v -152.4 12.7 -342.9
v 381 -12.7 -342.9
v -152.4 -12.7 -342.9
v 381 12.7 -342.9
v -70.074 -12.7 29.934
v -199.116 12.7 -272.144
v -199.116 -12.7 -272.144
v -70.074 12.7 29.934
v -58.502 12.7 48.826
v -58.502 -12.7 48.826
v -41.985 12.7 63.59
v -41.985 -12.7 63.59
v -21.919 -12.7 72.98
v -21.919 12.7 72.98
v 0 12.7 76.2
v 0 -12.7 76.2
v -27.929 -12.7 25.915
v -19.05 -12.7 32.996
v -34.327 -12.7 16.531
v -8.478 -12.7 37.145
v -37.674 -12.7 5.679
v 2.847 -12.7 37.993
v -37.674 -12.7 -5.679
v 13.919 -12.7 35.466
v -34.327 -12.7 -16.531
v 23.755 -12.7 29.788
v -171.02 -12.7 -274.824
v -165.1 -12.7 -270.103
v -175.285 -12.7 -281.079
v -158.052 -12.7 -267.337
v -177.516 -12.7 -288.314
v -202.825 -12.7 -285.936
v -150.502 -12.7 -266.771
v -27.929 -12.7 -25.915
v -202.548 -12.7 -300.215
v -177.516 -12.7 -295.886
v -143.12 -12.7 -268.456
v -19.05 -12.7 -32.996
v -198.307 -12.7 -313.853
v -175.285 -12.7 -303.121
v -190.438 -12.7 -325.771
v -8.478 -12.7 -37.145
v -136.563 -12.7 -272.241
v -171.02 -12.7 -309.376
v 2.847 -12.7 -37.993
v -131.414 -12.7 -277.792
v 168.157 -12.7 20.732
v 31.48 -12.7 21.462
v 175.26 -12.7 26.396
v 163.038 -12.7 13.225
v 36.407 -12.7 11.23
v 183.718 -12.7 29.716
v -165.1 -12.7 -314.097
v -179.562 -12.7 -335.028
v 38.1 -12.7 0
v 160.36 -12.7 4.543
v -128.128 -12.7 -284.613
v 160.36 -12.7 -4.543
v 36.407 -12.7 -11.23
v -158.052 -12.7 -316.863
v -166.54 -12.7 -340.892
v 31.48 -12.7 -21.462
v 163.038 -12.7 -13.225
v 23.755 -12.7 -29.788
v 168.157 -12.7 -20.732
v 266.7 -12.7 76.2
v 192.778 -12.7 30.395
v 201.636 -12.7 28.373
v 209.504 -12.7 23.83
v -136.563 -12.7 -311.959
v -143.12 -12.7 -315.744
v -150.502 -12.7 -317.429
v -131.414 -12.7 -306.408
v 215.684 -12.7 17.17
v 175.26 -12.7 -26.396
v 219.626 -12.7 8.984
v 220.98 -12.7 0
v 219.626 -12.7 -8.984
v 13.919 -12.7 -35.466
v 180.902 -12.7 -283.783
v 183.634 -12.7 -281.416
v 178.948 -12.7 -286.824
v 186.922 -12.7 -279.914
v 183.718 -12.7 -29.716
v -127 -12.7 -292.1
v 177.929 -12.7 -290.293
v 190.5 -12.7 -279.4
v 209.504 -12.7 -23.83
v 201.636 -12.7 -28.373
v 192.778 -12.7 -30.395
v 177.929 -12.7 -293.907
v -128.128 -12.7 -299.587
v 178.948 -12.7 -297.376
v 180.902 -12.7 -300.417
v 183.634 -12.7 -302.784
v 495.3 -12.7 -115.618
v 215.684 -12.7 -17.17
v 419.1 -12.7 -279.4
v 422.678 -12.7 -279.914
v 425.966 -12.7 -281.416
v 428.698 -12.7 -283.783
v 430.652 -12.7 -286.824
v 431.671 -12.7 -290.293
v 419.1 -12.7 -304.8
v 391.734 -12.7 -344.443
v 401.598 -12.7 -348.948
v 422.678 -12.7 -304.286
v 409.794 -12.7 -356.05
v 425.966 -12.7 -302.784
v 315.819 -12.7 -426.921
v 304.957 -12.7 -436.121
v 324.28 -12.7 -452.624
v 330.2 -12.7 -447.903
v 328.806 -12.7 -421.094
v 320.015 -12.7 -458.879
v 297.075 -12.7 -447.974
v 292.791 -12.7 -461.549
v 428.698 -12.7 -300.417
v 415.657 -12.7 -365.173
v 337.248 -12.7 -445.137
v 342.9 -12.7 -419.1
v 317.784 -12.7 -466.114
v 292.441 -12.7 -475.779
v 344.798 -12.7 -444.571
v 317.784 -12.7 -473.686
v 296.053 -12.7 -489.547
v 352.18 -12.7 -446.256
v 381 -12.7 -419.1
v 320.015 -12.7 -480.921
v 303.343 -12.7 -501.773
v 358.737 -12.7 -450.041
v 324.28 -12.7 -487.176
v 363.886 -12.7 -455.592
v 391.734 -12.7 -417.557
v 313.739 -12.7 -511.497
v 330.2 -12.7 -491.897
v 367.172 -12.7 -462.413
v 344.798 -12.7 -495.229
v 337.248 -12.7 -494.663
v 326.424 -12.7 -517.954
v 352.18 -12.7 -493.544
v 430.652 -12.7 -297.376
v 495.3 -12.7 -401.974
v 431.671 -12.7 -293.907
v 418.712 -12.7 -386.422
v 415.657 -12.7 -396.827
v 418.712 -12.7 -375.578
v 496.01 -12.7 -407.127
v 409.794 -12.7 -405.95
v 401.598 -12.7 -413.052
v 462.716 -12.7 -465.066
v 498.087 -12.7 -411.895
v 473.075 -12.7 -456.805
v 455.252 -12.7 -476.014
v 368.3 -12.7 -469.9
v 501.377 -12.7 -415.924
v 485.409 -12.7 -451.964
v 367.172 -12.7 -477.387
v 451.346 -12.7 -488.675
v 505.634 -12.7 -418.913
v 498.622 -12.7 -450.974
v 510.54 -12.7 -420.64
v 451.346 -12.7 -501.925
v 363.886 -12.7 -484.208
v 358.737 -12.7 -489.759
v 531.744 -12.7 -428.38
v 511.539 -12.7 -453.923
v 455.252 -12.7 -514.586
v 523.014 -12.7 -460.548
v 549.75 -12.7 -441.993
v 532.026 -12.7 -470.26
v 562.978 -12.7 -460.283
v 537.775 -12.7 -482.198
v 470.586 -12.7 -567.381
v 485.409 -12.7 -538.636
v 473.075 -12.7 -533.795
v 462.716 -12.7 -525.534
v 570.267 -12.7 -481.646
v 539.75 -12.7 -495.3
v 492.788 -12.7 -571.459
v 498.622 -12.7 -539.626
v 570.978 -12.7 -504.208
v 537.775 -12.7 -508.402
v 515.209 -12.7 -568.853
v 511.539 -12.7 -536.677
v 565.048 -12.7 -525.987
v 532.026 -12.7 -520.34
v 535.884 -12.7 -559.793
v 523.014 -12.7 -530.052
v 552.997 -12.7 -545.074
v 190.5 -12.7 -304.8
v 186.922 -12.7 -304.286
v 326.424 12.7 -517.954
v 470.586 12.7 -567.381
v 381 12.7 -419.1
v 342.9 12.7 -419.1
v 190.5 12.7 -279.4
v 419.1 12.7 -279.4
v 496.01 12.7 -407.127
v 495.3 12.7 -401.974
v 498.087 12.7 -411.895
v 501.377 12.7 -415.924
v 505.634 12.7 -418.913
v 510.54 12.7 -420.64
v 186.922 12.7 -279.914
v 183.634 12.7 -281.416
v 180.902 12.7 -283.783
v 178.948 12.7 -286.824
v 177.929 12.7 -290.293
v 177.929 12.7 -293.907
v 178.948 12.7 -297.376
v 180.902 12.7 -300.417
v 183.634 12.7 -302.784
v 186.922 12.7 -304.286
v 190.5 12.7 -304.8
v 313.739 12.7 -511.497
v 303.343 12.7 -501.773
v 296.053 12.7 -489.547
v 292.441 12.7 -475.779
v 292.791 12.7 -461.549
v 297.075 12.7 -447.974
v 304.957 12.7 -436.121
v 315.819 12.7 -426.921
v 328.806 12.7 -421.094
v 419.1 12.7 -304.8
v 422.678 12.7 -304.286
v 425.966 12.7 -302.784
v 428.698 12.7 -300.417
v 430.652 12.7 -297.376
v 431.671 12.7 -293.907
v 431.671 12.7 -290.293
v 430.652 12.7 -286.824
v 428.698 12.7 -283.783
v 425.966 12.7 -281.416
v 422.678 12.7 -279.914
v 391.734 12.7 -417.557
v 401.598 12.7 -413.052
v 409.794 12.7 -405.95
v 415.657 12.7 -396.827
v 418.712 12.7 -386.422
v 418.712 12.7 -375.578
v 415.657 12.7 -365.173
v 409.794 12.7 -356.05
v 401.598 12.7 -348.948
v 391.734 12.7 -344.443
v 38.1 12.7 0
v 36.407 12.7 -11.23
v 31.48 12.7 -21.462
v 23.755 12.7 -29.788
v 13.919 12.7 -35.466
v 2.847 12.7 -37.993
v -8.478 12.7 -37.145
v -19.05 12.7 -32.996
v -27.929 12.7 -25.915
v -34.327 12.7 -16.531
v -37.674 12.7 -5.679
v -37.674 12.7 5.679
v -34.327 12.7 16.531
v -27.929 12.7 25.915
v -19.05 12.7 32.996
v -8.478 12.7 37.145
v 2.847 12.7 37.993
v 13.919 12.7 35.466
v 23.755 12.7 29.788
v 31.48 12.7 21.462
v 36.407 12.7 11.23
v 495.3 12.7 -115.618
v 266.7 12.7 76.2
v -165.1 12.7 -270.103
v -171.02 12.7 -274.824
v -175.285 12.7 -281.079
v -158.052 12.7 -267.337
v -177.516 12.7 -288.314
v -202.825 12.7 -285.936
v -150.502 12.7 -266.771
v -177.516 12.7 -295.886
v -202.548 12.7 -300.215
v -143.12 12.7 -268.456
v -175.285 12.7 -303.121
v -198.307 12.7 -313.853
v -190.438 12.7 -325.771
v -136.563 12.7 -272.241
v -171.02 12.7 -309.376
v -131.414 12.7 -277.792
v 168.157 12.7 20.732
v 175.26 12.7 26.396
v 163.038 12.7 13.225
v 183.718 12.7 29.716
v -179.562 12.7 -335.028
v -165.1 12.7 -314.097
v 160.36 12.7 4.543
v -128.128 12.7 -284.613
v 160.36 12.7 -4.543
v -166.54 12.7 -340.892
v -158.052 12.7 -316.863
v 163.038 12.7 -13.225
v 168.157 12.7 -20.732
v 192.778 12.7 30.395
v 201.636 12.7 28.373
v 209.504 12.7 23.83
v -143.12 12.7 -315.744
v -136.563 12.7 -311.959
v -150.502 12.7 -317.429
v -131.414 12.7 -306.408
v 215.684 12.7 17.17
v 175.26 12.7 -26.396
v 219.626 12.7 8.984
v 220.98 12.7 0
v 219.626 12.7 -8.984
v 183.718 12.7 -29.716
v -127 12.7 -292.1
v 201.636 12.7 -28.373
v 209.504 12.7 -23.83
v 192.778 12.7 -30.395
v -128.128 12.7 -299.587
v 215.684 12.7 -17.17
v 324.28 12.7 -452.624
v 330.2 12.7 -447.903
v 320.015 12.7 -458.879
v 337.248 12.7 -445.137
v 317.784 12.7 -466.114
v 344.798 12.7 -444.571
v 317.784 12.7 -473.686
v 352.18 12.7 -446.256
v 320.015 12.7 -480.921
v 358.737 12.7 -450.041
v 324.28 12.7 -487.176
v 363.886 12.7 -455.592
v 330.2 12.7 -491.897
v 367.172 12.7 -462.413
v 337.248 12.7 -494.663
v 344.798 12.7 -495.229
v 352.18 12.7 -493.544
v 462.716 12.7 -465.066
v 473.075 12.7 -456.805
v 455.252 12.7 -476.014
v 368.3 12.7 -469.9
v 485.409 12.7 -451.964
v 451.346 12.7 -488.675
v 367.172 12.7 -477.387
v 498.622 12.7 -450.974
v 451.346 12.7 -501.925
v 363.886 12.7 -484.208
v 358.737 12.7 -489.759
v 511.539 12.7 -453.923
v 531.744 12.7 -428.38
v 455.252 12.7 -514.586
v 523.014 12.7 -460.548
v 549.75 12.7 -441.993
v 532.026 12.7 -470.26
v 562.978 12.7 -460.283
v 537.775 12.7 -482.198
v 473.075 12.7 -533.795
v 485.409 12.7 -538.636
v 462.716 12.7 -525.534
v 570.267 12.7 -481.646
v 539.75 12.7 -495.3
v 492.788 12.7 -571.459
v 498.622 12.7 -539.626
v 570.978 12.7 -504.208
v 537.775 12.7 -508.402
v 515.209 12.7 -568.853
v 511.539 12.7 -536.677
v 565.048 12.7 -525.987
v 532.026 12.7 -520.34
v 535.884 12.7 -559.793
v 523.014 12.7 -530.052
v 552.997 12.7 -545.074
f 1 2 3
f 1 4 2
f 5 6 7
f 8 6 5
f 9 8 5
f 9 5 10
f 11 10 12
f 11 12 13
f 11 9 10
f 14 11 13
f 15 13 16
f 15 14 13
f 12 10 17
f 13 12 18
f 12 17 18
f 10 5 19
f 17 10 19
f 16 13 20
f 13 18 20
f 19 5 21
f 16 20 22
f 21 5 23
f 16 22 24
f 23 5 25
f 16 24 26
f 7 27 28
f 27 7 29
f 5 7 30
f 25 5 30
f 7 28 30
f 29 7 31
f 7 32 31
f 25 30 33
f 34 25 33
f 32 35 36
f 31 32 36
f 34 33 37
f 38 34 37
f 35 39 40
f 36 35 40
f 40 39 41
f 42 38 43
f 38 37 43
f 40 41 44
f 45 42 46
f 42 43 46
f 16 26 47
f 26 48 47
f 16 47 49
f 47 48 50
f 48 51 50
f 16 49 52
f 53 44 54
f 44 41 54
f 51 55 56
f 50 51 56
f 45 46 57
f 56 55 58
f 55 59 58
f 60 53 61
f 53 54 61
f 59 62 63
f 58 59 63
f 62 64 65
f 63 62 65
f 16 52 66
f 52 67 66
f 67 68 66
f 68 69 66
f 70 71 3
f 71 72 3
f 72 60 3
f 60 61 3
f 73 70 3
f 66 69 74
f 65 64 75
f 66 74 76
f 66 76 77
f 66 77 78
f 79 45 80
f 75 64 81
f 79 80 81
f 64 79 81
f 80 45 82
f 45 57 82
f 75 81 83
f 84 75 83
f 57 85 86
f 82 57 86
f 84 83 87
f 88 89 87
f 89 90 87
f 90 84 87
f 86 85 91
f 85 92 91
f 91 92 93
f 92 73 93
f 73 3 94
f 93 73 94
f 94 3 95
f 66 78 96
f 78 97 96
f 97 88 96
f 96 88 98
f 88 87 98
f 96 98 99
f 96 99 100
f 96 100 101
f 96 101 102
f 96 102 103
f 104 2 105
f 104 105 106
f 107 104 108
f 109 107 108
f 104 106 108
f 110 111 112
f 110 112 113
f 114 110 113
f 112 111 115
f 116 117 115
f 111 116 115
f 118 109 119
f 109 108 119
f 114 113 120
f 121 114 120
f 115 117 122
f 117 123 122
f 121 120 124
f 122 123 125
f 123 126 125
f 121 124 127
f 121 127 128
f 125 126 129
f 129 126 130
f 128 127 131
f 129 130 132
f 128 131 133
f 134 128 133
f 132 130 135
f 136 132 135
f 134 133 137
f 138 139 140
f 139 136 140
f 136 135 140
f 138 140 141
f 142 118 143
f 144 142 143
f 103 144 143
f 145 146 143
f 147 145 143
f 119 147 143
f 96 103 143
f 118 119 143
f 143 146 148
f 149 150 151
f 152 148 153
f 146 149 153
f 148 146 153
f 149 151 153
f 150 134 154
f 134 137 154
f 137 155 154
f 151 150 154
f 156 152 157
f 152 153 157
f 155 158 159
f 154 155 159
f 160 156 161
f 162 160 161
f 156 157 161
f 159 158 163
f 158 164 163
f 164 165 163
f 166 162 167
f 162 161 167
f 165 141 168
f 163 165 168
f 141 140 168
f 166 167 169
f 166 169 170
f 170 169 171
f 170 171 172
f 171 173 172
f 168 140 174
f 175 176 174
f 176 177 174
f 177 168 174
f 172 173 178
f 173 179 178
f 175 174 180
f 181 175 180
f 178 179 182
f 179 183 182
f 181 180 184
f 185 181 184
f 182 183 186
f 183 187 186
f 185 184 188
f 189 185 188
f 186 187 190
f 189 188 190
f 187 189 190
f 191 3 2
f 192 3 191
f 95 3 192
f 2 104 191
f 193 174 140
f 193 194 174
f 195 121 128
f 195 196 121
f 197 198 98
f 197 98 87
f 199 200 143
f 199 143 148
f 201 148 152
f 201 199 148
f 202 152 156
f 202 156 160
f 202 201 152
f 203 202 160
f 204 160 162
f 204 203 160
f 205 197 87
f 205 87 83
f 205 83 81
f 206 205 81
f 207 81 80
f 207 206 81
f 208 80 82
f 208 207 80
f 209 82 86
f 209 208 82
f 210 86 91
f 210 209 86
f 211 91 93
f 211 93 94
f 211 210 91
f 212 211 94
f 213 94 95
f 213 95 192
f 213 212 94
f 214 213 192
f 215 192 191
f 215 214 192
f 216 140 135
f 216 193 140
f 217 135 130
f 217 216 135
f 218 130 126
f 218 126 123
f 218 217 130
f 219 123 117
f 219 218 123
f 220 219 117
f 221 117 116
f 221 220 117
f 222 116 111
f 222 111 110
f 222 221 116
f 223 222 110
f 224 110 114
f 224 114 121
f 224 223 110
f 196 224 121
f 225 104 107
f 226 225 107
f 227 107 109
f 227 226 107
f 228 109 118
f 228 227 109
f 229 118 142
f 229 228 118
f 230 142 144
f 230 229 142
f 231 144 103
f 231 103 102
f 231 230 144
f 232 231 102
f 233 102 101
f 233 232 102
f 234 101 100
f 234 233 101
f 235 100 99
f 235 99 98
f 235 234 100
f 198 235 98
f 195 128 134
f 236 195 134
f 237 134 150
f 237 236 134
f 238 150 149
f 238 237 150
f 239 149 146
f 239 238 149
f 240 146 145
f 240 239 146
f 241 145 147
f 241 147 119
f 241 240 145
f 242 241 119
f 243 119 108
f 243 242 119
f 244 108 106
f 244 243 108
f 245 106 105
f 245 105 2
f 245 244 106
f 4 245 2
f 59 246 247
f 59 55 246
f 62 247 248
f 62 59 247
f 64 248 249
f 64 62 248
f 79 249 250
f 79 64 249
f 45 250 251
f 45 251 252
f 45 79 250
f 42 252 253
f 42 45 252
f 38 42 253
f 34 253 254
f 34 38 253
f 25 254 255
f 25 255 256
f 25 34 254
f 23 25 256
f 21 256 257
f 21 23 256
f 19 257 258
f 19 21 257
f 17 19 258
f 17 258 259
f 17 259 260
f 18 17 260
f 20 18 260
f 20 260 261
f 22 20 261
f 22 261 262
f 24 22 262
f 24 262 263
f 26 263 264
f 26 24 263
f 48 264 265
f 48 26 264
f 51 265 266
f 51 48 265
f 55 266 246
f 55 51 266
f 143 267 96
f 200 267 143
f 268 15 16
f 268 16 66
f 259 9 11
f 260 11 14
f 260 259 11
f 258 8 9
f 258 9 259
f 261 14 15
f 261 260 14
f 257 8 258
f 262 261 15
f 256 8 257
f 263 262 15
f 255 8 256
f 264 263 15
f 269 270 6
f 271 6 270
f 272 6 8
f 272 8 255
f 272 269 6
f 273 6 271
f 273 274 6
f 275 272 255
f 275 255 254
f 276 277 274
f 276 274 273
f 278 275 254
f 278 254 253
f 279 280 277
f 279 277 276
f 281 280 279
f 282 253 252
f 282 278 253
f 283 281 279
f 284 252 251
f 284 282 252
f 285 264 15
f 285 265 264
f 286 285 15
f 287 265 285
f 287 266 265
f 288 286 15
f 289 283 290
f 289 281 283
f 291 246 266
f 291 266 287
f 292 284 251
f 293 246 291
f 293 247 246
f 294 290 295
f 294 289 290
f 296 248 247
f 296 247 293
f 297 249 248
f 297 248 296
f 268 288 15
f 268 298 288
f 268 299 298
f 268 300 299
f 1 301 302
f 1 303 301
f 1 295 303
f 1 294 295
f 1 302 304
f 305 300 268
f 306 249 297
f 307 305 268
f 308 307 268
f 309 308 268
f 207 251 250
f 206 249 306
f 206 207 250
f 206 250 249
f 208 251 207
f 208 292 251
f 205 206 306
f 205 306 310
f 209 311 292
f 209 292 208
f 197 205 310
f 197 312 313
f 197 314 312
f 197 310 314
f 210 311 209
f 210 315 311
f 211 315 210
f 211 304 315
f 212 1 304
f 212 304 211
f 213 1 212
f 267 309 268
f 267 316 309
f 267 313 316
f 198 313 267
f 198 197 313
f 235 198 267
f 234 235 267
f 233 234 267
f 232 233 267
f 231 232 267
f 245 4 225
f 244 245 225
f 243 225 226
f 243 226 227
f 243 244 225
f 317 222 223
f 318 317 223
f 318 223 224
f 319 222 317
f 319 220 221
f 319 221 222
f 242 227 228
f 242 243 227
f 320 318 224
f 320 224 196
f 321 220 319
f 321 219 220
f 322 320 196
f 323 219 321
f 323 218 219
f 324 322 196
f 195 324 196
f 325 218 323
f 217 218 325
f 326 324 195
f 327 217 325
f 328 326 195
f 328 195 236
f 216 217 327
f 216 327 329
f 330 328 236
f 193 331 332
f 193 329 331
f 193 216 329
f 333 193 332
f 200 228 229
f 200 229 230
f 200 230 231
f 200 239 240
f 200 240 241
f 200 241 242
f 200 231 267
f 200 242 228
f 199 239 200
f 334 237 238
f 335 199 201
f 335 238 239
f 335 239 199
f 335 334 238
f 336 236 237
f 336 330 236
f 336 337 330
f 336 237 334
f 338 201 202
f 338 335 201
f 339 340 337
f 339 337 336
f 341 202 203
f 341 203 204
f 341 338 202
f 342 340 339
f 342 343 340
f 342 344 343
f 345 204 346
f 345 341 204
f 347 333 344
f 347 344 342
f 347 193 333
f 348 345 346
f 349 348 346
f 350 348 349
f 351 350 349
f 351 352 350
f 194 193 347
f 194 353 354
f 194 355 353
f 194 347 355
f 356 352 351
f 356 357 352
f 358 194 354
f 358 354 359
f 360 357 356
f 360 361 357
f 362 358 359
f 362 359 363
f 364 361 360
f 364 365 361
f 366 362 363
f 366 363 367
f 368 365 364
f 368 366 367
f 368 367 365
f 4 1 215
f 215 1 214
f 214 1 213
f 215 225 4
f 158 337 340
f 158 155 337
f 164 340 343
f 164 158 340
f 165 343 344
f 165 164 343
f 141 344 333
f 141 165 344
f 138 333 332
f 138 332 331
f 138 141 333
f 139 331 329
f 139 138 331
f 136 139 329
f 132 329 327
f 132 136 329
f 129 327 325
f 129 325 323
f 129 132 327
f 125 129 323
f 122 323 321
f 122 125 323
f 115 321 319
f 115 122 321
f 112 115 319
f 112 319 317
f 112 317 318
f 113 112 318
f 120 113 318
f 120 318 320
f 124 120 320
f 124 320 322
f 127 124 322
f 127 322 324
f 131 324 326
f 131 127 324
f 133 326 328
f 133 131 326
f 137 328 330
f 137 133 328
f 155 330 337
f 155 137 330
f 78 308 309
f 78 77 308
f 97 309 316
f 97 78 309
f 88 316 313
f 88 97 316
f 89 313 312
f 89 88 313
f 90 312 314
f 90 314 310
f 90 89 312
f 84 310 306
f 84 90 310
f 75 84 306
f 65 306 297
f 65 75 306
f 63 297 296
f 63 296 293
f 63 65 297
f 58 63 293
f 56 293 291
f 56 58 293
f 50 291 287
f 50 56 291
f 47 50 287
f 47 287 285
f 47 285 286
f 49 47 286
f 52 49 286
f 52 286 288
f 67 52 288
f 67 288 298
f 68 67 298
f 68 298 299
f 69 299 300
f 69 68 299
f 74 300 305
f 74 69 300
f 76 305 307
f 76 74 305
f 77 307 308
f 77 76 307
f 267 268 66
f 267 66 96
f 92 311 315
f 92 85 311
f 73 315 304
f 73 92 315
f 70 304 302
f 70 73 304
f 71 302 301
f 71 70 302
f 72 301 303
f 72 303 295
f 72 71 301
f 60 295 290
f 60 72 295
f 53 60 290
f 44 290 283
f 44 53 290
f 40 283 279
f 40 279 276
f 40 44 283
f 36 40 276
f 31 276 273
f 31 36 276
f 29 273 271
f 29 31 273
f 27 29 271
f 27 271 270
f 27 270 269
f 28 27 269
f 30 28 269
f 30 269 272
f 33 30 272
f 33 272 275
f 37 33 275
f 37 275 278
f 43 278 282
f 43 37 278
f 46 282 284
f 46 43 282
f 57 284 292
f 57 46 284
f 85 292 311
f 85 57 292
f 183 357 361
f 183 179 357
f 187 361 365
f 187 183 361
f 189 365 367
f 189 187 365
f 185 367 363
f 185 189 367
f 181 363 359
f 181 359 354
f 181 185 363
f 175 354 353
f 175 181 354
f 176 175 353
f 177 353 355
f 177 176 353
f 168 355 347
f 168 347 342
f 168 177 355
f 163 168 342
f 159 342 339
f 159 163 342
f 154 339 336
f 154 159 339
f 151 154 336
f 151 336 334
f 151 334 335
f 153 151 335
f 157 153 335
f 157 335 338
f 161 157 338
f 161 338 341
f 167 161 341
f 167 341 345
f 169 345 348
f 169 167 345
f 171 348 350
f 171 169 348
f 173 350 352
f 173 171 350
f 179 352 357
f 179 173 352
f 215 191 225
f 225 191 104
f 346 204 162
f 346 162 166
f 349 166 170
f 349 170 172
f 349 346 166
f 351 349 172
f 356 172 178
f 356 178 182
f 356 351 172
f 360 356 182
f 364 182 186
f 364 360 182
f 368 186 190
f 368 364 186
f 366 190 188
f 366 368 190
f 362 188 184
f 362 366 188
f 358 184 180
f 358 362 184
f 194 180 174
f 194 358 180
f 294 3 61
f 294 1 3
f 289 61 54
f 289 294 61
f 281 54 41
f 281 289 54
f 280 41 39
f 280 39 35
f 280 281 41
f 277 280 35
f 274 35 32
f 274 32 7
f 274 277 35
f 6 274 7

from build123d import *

# Parameters (mm, degrees)
SKETCH1_R           = 25.4
SKETCH1_R_2         = 38.1
SKETCH1_R_3         = 44.45
SKETCH1_R_4         = 30.48
BOSS_EXTRUDE1_DEPTH = 12.7


with BuildPart() as part:
    # Sketch1 → Boss-Extrude1 (new body, symmetric)
    with BuildSketch(Plane(origin=(0, 0, 0), x_dir=(1, 0, 0), z_dir=(0, 1, 0))):
        with BuildLine():
            Line((-199.116056599, 272.143796557), (-70.074084898, -29.934305164))
            ThreePointArc((-70.074084898, -29.934305164), (-41.984794548, -63.590227447), (0, -76.2))
            Line((0, -76.2), (266.7, -76.2))
            Line((266.7, -76.2), (495.3, 115.618175687))
            Line((495.3, 115.618175687), (495.3, 401.9744408))
            ThreePointArc((495.3, 401.9744408), (499.593933451, 414.022718685), (510.54, 420.63955264))
            ThreePointArc((510.54, 420.63955264), (568.823505812, 515.318343915), (470.586486486, 567.381081081))
            Line((470.586486486, 567.381081081), (326.424324324, 517.954054054))
            ThreePointArc((326.424324324, 517.954054054), (292.791188669, 461.548531445), (342.9, 419.1))
            Line((342.9, 419.1), (381, 419.1))
            ThreePointArc((381, 419.1), (419.1, 381), (381, 342.9))
            Line((381, 342.9), (-152.4, 342.9))
            ThreePointArc((-152.4, 342.9), (-194.793484965, 320.089863032), (-199.116056599, 272.143796557))
        make_face()
        with Locations((-152.4, 292.1)):
            Circle(SKETCH1_R, mode=Mode.SUBTRACT)
        Circle(SKETCH1_R_2, mode=Mode.SUBTRACT)
        with Locations((342.9, 469.9)):
            Circle(SKETCH1_R, mode=Mode.SUBTRACT)
        with Locations((495.3, 495.3)):
            Circle(SKETCH1_R_3, mode=Mode.SUBTRACT)
        with Locations((190.5, 0)):
            Circle(SKETCH1_R_4, mode=Mode.SUBTRACT)
        with BuildLine():
            Line((190.5, 304.8), (419.1, 304.8))
            ThreePointArc((419.1, 304.8), (431.8, 292.1), (419.1, 279.4))
            Line((419.1, 279.4), (190.5, 279.4))
            ThreePointArc((190.5, 279.4), (177.8, 292.1), (190.5, 304.8))
        make_face(mode=Mode.SUBTRACT)
    extrude(amount=BOSS_EXTRUDE1_DEPTH, both=True)


solid = part.part
